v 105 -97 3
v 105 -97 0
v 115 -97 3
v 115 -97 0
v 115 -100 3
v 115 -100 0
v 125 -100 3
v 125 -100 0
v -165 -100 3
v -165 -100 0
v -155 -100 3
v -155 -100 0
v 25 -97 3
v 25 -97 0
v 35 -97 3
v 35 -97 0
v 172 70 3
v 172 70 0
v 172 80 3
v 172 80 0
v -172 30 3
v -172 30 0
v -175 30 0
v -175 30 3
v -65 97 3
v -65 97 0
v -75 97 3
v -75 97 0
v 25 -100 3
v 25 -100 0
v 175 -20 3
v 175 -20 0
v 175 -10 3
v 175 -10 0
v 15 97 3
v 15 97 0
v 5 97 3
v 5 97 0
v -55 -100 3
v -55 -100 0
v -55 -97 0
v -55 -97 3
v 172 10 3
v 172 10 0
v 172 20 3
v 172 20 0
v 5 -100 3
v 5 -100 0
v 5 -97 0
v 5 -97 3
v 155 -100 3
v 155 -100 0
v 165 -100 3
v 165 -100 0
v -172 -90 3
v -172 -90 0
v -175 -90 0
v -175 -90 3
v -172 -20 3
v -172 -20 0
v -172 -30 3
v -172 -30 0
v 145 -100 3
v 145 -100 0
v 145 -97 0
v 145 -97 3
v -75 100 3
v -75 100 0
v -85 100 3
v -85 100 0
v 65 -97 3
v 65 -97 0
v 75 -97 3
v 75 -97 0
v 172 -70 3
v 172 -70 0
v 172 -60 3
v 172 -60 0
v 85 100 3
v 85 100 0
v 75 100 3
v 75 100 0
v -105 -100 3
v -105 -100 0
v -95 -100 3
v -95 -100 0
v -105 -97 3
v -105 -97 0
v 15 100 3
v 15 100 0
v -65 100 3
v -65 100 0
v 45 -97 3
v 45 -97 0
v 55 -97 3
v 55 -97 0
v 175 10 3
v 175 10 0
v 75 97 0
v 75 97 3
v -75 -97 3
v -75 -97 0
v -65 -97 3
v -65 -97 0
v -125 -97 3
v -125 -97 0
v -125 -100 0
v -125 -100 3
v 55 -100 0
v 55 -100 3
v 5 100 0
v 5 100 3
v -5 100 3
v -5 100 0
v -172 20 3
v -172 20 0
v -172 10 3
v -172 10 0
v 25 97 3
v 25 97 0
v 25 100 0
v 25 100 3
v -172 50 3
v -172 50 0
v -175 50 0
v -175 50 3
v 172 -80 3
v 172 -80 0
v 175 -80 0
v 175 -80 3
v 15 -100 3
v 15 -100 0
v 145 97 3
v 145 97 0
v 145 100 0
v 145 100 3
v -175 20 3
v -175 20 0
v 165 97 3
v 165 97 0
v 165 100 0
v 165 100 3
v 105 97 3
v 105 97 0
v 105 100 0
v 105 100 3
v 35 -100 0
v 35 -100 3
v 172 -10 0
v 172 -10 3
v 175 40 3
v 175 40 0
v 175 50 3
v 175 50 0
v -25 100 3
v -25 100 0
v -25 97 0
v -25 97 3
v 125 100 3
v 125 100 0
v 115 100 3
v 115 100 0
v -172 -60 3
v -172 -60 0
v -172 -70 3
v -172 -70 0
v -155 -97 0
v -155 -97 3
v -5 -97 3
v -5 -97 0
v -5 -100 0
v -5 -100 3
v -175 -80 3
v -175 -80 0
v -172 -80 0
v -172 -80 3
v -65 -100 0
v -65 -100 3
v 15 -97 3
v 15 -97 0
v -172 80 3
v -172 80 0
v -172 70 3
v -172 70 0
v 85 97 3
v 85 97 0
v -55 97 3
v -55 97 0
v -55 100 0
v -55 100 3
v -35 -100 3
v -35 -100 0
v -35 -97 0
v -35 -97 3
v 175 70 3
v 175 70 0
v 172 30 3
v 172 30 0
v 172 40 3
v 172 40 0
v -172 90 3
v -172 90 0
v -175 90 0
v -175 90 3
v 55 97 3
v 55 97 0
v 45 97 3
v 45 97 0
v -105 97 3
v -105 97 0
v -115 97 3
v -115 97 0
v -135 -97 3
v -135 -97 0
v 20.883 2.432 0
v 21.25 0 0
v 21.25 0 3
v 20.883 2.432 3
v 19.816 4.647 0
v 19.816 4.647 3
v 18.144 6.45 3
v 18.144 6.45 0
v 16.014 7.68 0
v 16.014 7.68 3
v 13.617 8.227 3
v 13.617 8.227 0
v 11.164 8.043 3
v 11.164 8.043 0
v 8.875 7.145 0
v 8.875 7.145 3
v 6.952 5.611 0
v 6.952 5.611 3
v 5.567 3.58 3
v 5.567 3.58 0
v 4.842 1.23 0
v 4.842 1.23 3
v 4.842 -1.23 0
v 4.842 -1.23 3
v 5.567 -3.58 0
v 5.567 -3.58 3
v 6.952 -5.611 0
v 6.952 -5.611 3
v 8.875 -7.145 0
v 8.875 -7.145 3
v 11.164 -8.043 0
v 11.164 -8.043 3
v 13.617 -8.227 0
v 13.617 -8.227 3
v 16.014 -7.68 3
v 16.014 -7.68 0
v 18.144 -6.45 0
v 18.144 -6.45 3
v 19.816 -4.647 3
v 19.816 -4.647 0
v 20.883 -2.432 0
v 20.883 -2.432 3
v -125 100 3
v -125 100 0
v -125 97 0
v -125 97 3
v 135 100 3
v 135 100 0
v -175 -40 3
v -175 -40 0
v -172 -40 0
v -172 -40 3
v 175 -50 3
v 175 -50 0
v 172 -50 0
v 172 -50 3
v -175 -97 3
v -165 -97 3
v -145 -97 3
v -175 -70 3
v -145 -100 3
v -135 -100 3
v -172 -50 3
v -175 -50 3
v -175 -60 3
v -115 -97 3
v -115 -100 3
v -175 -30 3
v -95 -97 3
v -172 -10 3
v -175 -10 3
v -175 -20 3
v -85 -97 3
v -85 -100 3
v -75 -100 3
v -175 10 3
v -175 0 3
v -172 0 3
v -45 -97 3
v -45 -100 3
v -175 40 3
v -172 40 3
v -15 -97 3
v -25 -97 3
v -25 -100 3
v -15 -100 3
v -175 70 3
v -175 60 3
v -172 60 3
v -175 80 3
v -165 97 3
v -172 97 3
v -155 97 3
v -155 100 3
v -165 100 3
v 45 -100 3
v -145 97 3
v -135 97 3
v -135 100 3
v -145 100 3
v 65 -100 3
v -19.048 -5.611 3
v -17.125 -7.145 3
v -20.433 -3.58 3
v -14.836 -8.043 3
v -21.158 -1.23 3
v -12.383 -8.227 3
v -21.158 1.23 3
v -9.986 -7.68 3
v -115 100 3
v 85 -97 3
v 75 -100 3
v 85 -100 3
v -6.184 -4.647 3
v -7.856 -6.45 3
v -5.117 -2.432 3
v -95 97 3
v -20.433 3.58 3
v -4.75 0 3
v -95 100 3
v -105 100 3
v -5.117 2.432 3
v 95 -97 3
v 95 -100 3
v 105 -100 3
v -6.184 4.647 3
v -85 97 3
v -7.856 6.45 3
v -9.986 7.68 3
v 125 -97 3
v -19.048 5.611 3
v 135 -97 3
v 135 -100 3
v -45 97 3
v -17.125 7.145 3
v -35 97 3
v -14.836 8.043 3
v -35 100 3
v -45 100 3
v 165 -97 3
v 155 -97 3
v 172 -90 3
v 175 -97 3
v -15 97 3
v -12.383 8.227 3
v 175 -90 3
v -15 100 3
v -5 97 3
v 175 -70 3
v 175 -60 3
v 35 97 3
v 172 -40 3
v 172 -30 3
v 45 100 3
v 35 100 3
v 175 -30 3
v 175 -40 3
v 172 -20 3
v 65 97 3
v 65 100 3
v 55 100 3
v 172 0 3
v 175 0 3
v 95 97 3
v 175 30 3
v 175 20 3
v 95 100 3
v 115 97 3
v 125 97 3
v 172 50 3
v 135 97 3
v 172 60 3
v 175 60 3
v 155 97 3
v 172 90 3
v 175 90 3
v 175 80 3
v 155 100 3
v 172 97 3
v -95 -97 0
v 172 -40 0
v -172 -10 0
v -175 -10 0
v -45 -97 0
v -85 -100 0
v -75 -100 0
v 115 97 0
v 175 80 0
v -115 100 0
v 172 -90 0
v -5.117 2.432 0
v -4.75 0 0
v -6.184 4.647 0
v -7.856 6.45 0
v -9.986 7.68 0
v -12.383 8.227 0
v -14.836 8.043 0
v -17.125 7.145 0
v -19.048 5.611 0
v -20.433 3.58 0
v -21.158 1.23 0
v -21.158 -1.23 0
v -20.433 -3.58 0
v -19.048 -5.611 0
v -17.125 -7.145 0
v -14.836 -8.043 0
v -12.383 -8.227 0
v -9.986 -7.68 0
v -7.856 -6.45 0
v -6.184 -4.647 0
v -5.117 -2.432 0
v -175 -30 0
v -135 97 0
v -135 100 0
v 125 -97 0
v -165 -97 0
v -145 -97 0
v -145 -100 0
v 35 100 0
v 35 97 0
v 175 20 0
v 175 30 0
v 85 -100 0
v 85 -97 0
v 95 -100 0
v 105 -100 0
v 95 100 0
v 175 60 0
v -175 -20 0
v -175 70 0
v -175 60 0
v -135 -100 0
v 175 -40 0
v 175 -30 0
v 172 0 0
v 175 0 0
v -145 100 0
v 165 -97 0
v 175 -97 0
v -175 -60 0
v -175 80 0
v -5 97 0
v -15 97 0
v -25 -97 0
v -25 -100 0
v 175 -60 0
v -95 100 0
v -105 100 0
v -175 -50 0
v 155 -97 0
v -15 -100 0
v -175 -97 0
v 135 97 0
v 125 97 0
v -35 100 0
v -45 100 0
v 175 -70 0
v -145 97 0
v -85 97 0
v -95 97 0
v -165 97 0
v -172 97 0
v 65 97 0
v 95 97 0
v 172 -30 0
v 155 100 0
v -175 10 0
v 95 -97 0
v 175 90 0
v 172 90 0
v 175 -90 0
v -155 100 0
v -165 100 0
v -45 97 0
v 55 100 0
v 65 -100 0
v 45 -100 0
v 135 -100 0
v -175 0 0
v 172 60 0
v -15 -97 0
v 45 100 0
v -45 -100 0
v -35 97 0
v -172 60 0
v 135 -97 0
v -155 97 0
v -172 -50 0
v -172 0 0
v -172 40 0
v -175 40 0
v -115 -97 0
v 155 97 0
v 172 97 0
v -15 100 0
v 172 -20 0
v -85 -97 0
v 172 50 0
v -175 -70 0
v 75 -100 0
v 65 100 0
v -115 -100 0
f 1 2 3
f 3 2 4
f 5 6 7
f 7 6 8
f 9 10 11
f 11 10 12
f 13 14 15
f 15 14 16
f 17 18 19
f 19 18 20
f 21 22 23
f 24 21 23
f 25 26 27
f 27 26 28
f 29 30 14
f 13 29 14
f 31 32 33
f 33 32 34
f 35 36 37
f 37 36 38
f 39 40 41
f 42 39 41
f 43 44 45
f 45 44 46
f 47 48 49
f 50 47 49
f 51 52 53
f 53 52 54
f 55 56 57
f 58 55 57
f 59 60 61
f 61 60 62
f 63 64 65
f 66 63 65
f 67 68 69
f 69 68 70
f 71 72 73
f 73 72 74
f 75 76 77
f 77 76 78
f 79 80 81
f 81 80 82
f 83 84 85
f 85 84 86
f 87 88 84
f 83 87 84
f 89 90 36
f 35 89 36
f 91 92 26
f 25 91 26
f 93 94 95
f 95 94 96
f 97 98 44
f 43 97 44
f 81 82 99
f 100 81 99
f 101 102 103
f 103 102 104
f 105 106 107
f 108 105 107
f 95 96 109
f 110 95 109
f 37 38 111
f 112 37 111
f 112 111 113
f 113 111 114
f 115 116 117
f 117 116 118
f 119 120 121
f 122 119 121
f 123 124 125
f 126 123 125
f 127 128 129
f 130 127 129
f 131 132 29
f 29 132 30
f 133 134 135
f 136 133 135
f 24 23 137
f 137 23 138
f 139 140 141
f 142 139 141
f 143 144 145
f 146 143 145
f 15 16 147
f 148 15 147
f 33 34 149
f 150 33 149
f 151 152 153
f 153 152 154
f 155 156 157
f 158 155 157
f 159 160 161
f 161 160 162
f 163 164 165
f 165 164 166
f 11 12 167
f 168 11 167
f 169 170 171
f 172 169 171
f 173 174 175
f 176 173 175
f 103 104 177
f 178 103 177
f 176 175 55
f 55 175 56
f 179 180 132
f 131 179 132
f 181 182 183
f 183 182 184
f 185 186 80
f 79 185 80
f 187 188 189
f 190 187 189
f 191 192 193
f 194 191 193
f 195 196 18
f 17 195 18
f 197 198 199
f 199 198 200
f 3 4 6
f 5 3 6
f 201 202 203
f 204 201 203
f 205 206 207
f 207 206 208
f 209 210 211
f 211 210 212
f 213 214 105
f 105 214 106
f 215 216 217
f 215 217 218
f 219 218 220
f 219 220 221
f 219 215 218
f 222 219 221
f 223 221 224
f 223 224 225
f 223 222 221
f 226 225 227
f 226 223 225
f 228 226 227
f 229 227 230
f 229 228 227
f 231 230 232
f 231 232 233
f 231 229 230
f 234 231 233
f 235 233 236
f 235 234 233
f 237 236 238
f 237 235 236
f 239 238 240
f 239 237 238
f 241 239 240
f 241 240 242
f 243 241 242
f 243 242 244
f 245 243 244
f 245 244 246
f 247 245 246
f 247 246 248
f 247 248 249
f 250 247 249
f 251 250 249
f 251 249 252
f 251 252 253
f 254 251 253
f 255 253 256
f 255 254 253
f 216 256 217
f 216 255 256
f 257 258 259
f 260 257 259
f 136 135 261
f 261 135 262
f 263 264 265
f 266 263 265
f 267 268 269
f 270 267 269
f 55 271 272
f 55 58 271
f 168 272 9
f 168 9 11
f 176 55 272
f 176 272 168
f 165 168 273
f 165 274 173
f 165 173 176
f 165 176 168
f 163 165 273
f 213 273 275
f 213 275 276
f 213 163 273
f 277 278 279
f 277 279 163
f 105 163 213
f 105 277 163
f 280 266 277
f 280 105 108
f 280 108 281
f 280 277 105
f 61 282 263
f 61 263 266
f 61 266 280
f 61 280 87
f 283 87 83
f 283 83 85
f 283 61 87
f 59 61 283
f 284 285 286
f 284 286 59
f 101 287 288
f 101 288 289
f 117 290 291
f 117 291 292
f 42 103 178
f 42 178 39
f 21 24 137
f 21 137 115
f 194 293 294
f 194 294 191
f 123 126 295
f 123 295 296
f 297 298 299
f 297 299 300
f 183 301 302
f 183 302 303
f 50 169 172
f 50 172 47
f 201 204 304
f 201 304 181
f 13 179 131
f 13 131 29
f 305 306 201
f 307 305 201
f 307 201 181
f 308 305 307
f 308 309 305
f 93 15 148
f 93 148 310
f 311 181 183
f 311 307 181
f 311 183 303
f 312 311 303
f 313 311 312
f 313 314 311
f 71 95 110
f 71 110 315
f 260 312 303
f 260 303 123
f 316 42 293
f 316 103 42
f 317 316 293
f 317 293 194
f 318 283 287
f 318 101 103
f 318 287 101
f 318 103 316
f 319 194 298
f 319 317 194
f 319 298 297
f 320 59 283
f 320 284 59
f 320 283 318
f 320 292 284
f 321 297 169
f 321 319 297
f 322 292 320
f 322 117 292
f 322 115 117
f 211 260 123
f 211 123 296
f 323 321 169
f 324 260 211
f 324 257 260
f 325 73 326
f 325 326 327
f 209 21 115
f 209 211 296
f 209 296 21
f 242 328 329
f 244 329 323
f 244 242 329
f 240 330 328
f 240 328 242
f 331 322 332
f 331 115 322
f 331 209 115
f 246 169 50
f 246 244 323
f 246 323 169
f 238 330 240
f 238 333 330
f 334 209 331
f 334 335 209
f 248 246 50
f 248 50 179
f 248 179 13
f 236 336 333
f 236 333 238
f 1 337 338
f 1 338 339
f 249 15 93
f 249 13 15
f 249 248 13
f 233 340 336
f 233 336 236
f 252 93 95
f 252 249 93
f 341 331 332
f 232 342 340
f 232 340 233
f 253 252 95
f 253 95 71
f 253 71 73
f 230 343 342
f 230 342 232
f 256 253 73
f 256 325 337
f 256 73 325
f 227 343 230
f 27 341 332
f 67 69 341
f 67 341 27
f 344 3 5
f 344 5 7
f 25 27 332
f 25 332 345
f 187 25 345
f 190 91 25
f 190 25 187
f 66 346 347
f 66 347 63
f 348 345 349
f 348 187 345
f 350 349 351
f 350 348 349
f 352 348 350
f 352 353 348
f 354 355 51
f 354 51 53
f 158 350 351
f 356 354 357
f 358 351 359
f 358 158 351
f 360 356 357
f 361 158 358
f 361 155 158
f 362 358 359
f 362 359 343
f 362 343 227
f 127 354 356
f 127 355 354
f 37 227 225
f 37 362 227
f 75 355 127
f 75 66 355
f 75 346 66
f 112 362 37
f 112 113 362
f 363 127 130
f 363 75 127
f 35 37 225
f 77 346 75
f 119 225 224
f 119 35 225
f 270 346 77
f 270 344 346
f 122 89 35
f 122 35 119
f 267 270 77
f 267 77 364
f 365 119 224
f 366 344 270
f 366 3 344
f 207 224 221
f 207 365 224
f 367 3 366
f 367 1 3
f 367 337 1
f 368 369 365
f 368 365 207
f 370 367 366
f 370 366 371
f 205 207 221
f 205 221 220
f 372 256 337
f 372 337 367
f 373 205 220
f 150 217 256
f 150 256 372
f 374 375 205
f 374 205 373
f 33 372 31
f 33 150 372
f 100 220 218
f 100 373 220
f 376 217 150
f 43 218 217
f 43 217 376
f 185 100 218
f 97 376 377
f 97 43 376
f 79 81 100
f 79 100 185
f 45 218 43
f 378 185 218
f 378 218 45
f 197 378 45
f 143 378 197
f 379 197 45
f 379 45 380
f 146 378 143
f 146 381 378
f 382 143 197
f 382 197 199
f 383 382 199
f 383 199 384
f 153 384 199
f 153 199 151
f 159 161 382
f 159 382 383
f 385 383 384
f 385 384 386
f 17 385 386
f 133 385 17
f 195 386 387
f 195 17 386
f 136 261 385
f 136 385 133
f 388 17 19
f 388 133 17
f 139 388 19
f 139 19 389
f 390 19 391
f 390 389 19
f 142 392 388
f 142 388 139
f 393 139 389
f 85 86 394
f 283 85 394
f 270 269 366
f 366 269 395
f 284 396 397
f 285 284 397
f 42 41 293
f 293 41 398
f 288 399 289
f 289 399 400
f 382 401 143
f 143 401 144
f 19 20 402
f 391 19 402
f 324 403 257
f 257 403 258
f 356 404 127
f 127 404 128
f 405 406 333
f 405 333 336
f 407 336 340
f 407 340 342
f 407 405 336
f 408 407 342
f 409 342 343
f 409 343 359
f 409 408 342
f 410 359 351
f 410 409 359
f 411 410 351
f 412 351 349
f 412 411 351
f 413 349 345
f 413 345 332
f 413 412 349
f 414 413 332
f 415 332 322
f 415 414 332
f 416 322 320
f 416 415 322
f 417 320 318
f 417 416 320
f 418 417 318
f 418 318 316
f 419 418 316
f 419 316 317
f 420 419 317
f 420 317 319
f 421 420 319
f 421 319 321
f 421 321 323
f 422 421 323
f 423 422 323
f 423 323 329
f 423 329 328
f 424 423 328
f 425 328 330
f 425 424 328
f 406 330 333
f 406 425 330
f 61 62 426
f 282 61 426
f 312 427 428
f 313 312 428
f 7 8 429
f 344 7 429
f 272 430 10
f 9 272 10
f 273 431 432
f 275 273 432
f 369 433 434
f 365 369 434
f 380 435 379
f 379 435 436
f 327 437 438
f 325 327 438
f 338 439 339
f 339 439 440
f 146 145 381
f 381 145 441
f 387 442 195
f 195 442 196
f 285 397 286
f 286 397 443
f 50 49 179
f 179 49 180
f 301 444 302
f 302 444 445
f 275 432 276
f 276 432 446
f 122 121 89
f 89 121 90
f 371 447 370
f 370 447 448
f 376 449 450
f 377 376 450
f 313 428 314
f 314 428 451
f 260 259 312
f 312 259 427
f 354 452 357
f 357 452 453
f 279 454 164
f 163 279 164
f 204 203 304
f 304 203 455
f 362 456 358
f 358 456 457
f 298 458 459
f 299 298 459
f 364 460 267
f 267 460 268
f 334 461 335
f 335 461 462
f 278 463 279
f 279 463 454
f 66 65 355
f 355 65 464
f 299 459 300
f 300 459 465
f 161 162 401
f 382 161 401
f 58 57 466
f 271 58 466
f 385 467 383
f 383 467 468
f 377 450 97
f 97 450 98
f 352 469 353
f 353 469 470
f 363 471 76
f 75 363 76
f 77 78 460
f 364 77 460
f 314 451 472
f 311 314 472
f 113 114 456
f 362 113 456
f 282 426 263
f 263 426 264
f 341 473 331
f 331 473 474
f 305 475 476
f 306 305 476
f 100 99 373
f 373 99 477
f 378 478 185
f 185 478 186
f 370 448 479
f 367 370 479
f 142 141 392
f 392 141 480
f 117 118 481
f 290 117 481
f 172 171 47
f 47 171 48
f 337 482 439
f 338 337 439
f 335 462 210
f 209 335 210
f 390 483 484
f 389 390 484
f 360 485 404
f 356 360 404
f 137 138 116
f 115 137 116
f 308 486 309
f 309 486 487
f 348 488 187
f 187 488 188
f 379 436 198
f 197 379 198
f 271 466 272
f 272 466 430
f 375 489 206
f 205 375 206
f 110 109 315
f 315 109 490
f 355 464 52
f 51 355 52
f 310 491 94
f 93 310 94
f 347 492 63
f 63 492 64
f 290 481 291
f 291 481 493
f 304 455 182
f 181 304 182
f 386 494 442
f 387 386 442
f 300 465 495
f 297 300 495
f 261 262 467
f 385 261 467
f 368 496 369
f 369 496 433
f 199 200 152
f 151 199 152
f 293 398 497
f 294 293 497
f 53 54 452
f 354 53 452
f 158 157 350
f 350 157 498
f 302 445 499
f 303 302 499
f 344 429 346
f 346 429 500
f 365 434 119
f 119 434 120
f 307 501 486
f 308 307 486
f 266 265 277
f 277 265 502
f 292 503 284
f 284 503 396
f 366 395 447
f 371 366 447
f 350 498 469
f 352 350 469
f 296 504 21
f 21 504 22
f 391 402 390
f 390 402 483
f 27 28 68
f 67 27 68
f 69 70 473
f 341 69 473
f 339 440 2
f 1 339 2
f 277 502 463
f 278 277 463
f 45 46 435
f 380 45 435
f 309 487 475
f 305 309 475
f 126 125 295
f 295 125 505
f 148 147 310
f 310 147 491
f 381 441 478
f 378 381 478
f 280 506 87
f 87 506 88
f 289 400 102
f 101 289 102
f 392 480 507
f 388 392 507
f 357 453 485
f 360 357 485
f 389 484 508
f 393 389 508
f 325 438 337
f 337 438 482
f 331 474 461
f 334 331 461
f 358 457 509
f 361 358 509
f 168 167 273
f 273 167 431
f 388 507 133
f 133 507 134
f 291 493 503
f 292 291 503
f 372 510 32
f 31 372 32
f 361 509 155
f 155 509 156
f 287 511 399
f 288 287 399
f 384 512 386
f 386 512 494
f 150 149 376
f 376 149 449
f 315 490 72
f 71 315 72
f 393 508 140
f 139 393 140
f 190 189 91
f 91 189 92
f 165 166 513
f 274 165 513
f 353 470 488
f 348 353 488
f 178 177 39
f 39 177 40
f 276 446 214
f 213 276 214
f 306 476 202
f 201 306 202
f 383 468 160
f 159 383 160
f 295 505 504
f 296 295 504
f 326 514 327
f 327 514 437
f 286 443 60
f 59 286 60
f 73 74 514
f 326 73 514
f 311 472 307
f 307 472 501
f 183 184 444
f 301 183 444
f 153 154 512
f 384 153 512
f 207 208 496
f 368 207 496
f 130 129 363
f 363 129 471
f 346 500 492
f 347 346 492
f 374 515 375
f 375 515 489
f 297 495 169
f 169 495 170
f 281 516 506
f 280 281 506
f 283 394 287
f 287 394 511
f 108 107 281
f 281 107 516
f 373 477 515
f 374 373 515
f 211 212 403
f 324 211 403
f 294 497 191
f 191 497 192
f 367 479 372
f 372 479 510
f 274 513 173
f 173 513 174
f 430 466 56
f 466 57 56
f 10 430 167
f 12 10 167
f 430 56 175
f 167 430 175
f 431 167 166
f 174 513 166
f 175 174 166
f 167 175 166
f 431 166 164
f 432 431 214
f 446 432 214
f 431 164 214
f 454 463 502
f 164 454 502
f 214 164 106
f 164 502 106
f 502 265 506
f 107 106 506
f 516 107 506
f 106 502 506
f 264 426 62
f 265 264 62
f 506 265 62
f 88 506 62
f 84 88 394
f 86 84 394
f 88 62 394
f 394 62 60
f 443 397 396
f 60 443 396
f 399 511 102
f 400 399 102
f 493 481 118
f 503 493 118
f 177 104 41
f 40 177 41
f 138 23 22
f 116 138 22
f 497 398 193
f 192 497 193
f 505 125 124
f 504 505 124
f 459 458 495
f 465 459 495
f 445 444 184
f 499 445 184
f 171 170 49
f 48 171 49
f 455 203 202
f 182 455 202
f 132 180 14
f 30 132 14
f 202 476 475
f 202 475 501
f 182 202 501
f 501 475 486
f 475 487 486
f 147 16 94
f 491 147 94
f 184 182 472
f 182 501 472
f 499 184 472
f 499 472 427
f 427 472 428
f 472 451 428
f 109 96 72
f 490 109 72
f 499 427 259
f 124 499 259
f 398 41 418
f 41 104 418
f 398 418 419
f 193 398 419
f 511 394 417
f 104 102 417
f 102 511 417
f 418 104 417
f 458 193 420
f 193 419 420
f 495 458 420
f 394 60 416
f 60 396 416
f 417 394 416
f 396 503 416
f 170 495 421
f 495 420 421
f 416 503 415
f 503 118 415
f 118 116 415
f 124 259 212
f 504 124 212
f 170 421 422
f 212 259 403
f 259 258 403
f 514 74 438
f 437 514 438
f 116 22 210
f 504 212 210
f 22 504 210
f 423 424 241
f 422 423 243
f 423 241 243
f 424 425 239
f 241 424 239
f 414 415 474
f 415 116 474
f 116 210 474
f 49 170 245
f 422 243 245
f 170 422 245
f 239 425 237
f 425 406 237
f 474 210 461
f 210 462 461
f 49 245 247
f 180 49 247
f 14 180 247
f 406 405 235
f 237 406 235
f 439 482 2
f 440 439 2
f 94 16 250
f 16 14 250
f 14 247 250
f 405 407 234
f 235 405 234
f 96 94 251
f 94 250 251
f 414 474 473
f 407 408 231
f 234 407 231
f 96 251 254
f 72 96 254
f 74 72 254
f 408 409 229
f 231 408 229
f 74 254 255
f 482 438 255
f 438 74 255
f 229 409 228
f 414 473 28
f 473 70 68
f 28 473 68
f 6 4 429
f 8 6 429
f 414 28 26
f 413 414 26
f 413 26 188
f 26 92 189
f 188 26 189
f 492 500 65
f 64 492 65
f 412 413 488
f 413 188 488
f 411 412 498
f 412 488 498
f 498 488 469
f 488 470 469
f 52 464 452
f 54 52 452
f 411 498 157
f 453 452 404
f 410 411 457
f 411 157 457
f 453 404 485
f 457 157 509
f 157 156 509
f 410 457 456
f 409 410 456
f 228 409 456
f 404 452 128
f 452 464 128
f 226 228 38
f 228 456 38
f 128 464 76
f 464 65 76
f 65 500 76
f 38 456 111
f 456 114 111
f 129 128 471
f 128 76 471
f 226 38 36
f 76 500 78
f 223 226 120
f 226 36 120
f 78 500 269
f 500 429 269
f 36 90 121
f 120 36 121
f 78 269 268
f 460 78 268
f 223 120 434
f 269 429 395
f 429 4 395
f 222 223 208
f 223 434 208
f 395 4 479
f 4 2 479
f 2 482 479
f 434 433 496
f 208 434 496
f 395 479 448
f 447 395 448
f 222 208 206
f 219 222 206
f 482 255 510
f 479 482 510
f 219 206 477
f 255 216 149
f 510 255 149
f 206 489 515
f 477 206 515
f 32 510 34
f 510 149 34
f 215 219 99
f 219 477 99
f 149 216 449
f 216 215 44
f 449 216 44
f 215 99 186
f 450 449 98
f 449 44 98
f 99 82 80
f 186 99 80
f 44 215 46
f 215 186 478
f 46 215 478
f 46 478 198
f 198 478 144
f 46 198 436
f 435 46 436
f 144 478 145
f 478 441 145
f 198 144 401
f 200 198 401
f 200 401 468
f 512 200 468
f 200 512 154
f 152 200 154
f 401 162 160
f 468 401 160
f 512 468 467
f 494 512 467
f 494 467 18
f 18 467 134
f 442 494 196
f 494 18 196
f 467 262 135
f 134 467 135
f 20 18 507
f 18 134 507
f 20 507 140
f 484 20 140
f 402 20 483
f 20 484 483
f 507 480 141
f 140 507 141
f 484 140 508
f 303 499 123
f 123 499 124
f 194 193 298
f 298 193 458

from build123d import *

# Parameters (mm, degrees)
CROQUIS1_R              = 8.25
SALIENTE_EXTRUIR1_DEPTH = 3


with BuildPart() as part:
    # Croquis1 → Saliente-Extruir1 (new body)
    with BuildSketch(Plane.XY):
        Polygon((-175, -97), (-165, -97), (-165, -100), (-155, -100), (-155, -97), (-145, -97), (-145, -100), (-135, -100), (-135, -97), (-125, -97), (-125, -100), (-115, -100), (-115, -97), (-105, -97), (-105, -100), (-95, -100), (-95, -97), (-85, -97), (-85, -100), (-75, -100), (-75, -97), (-65, -97), (-65, -100), (-55, -100), (-55, -97), (-45, -97), (-45, -100), (-35, -100), (-35, -97), (-25, -97), (-25, -100), (-15, -100), (-15, -97), (-5, -97), (-5, -100), (5, -100), (5, -97), (15, -97), (15, -100), (25, -100), (25, -97), (35, -97), (35, -100), (45, -100), (45, -97), (55, -97), (55, -100), (65, -100), (65, -97), (75, -97), (75, -100), (85, -100), (85, -97), (95, -97), (95, -100), (105, -100), (105, -97), (115, -97), (115, -100), (125, -100), (125, -97), (135, -97), (135, -100), (145, -100), (145, -97), (155, -97), (155, -100), (165, -100), (165, -97), (175, -97), (175, -90), (172, -90), (172, -80), (175, -80), (175, -70), (172, -70), (172, -60), (175, -60), (175, -50), (172, -50), (172, -40), (175, -40), (175, -30), (172, -30), (172, -20), (175, -20), (175, -10), (172, -10), (172, 0), (175, 0), (175, 10), (172, 10), (172, 20), (175, 20), (175, 30), (172, 30), (172, 40), (175, 40), (175, 50), (172, 50), (172, 60), (175, 60), (175, 70), (172, 70), (172, 80), (175, 80), (175, 90), (172, 90), (172, 97), (165, 97), (165, 100), (155, 100), (155, 97), (145, 97), (145, 100), (135, 100), (135, 97), (125, 97), (125, 100), (115, 100), (115, 97), (105, 97), (105, 100), (95, 100), (95, 97), (85, 97), (85, 100), (75, 100), (75, 97), (65, 97), (65, 100), (55, 100), (55, 97), (45, 97), (45, 100), (35, 100), (35, 97), (25, 97), (25, 100), (15, 100), (15, 97), (5, 97), (5, 100), (-5, 100), (-5, 97), (-15, 97), (-15, 100), (-25, 100), (-25, 97), (-35, 97), (-35, 100), (-45, 100), (-45, 97), (-55, 97), (-55, 100), (-65, 100), (-65, 97), (-75, 97), (-75, 100), (-85, 100), (-85, 97), (-95, 97), (-95, 100), (-105, 100), (-105, 97), (-115, 97), (-115, 100), (-125, 100), (-125, 97), (-135, 97), (-135, 100), (-145, 100), (-145, 97), (-155, 97), (-155, 100), (-165, 100), (-165, 97), (-172, 97), (-172, 90), (-175, 90), (-175, 80), (-172, 80), (-172, 70), (-175, 70), (-175, 60), (-172, 60), (-172, 50), (-175, 50), (-175, 40), (-172, 40), (-172, 30), (-175, 30), (-175, 20), (-172, 20), (-172, 10), (-175, 10), (-175, 0), (-172, 0), (-172, -10), (-175, -10), (-175, -20), (-172, -20), (-172, -30), (-175, -30), (-175, -40), (-172, -40), (-172, -50), (-175, -50), (-175, -60), (-172, -60), (-172, -70), (-175, -70), (-175, -80), (-172, -80), (-172, -90), (-175, -90), align=None)
        with Locations((-13, 0)):
            Circle(CROQUIS1_R, mode=Mode.SUBTRACT)
        with Locations((13, 0)):
            Circle(CROQUIS1_R, mode=Mode.SUBTRACT)
    extrude(amount=SALIENTE_EXTRUIR1_DEPTH)


solid = part.part
